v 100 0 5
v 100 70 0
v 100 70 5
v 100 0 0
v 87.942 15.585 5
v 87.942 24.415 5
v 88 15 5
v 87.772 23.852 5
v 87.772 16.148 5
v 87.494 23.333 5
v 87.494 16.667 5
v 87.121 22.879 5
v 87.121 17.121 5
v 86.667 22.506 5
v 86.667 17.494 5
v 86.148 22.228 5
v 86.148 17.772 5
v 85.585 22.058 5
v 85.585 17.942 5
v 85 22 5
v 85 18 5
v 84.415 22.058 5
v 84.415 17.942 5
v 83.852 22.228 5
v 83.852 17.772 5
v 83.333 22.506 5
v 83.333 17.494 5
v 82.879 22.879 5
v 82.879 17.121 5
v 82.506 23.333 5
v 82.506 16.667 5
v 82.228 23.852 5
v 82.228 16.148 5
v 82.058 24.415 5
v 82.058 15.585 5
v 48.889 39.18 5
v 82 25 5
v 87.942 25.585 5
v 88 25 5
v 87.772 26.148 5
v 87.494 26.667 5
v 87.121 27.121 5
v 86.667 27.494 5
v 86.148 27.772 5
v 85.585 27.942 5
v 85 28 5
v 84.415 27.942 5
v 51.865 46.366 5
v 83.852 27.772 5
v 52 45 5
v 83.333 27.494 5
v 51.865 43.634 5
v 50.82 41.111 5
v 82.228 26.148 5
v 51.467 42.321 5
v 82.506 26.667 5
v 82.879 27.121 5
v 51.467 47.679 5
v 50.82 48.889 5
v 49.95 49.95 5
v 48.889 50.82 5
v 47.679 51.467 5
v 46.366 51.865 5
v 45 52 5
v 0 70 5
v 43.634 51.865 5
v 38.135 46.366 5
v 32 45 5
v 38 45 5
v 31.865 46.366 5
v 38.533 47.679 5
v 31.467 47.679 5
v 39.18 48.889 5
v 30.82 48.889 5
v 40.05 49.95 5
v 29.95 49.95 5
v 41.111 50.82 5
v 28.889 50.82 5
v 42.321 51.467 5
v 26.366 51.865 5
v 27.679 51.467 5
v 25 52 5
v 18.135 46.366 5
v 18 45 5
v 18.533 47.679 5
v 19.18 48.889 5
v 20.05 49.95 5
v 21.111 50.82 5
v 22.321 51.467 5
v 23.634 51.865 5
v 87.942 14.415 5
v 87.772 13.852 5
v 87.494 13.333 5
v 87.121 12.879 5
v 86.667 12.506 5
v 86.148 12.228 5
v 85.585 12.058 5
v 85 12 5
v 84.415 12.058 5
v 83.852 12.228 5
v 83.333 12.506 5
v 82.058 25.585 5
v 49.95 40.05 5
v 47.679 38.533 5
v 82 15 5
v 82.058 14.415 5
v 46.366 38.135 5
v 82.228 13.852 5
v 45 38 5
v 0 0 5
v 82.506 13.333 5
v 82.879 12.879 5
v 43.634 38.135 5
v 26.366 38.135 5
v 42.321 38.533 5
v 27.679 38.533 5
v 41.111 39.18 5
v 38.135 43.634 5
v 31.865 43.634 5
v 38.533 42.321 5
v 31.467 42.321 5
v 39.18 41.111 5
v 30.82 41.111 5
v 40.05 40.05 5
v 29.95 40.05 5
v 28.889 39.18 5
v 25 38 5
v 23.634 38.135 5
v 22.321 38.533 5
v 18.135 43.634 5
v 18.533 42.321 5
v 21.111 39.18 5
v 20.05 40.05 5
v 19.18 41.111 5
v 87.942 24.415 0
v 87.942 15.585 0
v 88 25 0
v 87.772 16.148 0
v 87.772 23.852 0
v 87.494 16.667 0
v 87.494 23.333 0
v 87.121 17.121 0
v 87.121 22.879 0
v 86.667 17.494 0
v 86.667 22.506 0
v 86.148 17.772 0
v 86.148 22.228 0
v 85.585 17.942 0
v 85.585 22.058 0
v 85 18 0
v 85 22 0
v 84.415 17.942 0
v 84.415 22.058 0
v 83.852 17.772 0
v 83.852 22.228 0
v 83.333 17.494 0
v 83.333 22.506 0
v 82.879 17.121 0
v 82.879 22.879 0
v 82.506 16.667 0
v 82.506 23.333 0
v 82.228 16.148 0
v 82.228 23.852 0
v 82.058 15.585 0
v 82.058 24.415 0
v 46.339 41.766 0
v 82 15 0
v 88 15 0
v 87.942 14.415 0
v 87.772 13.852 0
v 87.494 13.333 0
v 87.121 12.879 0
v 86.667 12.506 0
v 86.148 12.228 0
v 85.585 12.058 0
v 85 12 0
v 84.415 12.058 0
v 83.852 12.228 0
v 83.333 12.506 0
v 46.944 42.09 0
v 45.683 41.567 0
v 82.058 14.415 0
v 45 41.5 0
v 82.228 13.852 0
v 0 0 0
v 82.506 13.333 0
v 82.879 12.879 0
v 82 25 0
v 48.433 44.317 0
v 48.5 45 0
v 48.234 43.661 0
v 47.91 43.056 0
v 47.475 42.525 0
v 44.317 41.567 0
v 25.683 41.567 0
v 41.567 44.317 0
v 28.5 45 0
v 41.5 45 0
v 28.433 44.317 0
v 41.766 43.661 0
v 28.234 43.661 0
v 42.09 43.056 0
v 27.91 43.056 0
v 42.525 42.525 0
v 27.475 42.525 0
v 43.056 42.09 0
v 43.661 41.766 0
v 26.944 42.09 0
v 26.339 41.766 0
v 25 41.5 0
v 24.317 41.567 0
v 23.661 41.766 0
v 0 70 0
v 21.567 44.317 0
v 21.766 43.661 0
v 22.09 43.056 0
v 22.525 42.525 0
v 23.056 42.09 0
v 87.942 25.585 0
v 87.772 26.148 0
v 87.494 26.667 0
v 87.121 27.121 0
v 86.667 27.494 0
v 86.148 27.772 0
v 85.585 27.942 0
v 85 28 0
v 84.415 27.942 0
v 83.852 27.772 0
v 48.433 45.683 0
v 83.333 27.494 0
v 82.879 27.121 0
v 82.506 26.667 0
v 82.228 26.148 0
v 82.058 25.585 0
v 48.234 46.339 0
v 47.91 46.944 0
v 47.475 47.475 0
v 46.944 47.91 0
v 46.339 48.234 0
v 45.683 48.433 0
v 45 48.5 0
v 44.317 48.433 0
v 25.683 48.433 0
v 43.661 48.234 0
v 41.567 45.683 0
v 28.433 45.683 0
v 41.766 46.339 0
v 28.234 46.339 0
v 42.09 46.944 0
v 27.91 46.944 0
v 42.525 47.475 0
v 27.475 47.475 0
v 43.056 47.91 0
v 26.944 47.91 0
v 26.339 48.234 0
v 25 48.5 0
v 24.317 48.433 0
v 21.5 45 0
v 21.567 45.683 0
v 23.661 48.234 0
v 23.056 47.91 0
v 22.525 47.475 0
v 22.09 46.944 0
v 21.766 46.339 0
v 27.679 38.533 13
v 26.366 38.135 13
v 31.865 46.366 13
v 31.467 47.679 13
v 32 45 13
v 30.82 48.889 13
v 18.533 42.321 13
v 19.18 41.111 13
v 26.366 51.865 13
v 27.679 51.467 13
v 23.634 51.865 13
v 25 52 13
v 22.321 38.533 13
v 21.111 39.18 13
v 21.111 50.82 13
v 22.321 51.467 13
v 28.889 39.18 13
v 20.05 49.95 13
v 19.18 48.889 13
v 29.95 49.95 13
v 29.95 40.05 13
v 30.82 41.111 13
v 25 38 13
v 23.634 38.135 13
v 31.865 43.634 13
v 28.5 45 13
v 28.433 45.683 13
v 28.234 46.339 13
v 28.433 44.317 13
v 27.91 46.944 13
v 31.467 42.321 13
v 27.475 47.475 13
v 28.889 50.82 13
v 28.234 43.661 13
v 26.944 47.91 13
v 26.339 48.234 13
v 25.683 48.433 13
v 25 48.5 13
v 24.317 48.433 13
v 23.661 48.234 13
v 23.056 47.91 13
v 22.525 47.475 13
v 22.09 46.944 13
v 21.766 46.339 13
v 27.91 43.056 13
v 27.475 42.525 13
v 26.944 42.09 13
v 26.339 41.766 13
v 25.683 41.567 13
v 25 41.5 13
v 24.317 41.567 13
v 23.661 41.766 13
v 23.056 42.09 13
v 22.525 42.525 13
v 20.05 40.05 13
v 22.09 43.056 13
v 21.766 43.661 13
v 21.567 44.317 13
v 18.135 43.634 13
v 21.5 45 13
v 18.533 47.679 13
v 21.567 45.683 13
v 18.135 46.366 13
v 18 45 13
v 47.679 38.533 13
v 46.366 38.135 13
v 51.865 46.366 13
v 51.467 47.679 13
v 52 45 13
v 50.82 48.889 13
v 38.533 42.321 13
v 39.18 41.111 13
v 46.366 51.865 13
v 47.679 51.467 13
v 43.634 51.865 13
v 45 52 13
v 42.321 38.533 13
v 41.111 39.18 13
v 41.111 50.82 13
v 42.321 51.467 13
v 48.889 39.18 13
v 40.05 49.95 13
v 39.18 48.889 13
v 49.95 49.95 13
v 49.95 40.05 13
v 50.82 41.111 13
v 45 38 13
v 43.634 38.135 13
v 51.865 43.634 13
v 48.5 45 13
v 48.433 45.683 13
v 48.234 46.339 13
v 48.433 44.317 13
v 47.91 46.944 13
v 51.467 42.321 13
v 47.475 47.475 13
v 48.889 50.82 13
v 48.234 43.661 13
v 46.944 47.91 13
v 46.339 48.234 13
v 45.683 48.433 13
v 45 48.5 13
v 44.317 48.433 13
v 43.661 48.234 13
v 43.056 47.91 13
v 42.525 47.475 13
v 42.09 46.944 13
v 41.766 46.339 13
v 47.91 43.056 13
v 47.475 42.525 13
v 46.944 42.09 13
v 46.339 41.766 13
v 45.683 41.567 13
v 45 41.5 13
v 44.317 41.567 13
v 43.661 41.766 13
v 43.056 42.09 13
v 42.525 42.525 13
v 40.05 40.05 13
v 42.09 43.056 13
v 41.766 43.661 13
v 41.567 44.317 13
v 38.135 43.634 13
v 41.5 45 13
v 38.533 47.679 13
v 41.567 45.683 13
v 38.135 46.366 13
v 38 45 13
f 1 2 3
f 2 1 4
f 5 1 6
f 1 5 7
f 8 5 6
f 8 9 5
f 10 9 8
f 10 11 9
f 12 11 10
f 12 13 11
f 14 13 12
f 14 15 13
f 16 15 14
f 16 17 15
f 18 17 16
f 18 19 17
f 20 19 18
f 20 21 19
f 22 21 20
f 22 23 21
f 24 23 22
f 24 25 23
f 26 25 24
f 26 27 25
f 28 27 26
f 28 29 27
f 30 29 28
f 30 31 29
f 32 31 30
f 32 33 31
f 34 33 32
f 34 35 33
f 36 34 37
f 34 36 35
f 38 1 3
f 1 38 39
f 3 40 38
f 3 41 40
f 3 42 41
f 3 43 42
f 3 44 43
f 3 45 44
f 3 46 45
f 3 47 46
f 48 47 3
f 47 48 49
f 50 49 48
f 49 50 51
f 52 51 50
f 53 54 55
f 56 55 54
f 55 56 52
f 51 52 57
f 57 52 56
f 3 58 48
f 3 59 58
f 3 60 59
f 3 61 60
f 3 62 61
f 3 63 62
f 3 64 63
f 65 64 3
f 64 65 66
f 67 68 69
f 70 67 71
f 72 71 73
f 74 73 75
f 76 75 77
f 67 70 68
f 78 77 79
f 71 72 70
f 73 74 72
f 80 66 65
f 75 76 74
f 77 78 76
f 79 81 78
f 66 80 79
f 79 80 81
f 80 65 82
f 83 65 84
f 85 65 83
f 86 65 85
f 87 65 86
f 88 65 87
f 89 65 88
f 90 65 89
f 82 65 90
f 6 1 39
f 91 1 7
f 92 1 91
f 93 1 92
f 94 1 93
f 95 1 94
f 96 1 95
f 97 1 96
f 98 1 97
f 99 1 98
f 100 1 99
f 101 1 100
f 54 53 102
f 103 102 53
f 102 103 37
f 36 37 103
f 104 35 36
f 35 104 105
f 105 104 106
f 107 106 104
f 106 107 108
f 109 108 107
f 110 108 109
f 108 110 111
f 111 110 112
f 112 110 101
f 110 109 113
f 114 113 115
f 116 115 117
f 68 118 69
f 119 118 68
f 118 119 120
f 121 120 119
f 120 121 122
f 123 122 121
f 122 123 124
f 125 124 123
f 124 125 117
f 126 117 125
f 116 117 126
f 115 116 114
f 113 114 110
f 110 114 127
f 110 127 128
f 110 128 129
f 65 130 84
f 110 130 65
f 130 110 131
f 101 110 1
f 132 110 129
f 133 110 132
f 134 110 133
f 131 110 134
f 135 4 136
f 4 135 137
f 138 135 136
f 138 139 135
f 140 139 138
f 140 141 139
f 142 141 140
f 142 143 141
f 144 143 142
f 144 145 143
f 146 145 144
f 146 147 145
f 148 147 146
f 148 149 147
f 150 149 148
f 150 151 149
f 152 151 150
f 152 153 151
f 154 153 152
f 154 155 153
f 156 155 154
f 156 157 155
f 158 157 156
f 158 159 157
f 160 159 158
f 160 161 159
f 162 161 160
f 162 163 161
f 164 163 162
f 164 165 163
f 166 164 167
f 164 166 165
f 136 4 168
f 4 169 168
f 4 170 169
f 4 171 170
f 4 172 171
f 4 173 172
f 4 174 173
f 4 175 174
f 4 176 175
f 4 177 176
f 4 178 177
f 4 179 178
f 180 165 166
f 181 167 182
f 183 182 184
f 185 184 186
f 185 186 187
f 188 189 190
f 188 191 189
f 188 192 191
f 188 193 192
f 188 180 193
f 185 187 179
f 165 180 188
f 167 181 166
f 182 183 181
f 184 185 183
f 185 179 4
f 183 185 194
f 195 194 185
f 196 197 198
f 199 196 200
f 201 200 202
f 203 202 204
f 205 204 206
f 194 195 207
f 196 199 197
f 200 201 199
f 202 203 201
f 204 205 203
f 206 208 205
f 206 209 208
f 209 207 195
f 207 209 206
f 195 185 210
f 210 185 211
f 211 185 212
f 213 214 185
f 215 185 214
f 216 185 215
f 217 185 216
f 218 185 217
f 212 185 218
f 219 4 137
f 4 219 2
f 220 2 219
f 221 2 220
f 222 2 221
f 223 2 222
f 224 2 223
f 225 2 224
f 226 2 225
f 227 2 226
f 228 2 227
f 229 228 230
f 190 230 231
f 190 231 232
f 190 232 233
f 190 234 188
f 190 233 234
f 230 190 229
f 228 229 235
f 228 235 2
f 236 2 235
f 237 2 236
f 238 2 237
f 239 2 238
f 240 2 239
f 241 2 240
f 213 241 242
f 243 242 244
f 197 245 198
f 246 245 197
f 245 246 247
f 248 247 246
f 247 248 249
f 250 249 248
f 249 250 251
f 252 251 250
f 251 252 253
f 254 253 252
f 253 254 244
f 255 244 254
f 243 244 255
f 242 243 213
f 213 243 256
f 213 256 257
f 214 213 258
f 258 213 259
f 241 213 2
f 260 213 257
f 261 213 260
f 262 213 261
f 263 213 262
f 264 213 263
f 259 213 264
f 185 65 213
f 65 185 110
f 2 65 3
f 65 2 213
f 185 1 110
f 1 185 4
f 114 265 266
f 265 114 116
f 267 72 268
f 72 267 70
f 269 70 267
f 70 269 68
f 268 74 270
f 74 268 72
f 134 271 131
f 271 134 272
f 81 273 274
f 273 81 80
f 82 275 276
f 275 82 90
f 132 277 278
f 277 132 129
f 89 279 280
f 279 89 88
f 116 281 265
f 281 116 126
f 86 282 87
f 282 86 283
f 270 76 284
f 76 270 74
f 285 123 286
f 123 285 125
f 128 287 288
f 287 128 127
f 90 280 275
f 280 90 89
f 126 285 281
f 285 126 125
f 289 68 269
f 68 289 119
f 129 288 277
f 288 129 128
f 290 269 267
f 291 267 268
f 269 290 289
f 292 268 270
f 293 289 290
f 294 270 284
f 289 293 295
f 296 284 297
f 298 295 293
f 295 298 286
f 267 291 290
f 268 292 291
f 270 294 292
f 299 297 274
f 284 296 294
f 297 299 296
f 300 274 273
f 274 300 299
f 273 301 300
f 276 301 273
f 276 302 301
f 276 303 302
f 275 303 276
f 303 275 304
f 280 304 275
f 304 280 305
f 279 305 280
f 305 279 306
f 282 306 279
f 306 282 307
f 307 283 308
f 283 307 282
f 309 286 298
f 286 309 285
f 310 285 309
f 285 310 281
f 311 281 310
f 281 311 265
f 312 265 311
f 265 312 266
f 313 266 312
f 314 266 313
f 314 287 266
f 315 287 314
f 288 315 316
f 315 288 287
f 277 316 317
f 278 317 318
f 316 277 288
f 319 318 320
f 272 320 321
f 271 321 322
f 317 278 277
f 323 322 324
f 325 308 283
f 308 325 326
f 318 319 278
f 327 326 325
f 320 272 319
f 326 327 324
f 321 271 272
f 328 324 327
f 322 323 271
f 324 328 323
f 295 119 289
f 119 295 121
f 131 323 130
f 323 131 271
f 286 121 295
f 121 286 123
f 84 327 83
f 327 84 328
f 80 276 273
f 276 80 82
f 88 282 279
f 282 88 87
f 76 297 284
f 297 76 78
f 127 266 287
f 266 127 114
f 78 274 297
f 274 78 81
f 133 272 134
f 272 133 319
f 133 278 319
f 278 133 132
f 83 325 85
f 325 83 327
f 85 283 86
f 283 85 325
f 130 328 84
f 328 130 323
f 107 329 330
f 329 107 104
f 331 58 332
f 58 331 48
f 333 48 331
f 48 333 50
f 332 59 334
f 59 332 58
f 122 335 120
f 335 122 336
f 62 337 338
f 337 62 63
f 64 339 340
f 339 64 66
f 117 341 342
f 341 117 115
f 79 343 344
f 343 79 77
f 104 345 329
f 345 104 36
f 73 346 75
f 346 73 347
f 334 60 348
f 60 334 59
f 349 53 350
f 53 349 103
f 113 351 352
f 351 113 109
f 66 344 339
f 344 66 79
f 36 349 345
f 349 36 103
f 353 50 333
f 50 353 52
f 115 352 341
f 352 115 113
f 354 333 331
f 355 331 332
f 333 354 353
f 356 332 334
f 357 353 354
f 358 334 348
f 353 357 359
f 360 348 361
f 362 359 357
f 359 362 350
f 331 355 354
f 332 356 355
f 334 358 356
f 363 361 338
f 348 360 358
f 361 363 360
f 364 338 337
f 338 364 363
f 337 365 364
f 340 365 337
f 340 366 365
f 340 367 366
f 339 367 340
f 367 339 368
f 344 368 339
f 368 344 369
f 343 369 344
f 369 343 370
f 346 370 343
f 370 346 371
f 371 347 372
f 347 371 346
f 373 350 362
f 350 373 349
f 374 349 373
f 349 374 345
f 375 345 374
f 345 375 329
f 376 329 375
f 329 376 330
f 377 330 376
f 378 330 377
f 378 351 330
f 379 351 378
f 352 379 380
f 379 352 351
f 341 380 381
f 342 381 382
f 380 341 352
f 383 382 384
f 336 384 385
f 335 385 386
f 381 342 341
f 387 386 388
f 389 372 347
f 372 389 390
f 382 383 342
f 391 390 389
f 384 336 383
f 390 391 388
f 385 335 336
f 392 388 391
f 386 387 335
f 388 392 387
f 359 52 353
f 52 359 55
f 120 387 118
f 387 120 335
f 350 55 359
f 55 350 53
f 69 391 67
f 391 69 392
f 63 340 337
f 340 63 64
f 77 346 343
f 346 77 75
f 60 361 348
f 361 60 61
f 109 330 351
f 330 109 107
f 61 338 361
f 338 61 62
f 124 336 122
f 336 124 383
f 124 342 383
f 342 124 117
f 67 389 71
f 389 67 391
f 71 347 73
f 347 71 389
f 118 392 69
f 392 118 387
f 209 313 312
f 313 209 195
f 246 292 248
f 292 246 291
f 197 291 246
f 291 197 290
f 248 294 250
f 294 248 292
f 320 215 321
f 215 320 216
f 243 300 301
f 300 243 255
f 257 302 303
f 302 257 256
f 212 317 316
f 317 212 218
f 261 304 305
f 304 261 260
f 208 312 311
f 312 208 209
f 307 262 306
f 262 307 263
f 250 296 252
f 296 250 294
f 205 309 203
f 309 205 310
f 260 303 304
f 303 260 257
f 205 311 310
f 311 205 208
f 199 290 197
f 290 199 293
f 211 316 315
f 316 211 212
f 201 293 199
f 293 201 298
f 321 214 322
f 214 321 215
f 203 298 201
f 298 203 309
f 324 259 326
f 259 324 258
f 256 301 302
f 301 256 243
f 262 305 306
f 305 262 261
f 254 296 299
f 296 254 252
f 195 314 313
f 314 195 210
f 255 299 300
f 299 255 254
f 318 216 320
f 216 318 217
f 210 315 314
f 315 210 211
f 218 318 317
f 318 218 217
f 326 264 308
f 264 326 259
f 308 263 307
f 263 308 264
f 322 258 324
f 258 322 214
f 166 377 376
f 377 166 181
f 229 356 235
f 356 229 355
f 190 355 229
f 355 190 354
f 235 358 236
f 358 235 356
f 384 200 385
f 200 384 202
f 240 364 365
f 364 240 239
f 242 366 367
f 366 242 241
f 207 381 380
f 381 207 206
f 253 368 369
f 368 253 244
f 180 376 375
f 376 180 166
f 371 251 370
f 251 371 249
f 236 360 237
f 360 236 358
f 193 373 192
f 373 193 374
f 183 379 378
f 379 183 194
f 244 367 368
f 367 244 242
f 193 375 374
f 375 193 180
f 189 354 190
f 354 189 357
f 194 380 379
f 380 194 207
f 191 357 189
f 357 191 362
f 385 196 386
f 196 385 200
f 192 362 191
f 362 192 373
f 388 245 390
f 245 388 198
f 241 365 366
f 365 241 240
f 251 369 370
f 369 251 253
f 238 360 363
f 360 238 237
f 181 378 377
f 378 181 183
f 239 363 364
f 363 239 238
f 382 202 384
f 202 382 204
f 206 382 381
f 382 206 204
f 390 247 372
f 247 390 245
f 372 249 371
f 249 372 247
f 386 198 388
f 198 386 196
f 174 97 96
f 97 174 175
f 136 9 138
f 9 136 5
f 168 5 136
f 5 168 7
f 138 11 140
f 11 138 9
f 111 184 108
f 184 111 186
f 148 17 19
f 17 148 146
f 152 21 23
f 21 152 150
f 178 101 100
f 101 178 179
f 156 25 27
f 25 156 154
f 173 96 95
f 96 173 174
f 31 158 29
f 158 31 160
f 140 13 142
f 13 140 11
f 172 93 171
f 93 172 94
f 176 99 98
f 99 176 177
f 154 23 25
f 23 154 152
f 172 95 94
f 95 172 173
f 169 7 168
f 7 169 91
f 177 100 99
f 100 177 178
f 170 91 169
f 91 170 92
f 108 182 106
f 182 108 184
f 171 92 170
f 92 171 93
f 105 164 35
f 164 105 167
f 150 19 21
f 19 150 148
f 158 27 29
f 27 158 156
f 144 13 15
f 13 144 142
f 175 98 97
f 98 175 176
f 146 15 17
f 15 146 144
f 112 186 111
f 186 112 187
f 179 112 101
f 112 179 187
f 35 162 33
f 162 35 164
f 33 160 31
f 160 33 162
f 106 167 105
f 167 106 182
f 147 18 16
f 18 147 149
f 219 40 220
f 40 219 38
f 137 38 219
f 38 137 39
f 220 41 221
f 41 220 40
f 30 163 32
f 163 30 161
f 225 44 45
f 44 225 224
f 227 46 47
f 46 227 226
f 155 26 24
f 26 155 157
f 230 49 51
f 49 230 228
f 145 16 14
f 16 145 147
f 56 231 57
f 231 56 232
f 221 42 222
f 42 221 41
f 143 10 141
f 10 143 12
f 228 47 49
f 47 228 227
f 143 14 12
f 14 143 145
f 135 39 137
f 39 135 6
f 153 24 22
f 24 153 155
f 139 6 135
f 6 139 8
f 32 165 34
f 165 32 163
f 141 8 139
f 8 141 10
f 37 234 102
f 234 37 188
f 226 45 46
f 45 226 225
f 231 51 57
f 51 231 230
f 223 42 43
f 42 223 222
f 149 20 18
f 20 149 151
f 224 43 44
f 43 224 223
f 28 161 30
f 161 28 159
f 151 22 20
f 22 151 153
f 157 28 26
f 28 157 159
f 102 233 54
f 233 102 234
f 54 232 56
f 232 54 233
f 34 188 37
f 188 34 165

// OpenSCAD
$fn = 32;

// ----------------------------------------------------------------------
// Mixed field: bosses and holes at given coordinates
// ----------------------------------------------------------------------

// --- parameters (mm) ---
plate_l = 100;            // plate length, X
plate_w = 70;             // plate width, Y
plate_t = 5;              // plate thickness, Z
boss_d = 14;              // boss diameter
boss_h = 8;               // boss height above the plate
hole_d = 6;               // through hole diameter
fit_tol = 0.05;           // tolerance for press fits, mm
free_tol = 0.3;           // tolerance for clearance fits, mm

total_h = plate_t + boss_h;  // overall height

difference() {
  union() {
    cube([plate_l, plate_w, plate_t]);
    translate([25, 45, plate_t]) cylinder(h = boss_h, d = boss_d);
    translate([45, 45, plate_t]) cylinder(h = boss_h, d = boss_d);
  }
  translate([25, 45, -1]) cylinder(h = total_h + 2, d = boss_d / 2);
  translate([45, 45, -1]) cylinder(h = total_h + 2, d = boss_d / 2);
  translate([85, 15, -1]) cylinder(h = plate_t + 2, d = hole_d);
  translate([85, 25, -1]) cylinder(h = plate_t + 2, d = hole_d);
}
